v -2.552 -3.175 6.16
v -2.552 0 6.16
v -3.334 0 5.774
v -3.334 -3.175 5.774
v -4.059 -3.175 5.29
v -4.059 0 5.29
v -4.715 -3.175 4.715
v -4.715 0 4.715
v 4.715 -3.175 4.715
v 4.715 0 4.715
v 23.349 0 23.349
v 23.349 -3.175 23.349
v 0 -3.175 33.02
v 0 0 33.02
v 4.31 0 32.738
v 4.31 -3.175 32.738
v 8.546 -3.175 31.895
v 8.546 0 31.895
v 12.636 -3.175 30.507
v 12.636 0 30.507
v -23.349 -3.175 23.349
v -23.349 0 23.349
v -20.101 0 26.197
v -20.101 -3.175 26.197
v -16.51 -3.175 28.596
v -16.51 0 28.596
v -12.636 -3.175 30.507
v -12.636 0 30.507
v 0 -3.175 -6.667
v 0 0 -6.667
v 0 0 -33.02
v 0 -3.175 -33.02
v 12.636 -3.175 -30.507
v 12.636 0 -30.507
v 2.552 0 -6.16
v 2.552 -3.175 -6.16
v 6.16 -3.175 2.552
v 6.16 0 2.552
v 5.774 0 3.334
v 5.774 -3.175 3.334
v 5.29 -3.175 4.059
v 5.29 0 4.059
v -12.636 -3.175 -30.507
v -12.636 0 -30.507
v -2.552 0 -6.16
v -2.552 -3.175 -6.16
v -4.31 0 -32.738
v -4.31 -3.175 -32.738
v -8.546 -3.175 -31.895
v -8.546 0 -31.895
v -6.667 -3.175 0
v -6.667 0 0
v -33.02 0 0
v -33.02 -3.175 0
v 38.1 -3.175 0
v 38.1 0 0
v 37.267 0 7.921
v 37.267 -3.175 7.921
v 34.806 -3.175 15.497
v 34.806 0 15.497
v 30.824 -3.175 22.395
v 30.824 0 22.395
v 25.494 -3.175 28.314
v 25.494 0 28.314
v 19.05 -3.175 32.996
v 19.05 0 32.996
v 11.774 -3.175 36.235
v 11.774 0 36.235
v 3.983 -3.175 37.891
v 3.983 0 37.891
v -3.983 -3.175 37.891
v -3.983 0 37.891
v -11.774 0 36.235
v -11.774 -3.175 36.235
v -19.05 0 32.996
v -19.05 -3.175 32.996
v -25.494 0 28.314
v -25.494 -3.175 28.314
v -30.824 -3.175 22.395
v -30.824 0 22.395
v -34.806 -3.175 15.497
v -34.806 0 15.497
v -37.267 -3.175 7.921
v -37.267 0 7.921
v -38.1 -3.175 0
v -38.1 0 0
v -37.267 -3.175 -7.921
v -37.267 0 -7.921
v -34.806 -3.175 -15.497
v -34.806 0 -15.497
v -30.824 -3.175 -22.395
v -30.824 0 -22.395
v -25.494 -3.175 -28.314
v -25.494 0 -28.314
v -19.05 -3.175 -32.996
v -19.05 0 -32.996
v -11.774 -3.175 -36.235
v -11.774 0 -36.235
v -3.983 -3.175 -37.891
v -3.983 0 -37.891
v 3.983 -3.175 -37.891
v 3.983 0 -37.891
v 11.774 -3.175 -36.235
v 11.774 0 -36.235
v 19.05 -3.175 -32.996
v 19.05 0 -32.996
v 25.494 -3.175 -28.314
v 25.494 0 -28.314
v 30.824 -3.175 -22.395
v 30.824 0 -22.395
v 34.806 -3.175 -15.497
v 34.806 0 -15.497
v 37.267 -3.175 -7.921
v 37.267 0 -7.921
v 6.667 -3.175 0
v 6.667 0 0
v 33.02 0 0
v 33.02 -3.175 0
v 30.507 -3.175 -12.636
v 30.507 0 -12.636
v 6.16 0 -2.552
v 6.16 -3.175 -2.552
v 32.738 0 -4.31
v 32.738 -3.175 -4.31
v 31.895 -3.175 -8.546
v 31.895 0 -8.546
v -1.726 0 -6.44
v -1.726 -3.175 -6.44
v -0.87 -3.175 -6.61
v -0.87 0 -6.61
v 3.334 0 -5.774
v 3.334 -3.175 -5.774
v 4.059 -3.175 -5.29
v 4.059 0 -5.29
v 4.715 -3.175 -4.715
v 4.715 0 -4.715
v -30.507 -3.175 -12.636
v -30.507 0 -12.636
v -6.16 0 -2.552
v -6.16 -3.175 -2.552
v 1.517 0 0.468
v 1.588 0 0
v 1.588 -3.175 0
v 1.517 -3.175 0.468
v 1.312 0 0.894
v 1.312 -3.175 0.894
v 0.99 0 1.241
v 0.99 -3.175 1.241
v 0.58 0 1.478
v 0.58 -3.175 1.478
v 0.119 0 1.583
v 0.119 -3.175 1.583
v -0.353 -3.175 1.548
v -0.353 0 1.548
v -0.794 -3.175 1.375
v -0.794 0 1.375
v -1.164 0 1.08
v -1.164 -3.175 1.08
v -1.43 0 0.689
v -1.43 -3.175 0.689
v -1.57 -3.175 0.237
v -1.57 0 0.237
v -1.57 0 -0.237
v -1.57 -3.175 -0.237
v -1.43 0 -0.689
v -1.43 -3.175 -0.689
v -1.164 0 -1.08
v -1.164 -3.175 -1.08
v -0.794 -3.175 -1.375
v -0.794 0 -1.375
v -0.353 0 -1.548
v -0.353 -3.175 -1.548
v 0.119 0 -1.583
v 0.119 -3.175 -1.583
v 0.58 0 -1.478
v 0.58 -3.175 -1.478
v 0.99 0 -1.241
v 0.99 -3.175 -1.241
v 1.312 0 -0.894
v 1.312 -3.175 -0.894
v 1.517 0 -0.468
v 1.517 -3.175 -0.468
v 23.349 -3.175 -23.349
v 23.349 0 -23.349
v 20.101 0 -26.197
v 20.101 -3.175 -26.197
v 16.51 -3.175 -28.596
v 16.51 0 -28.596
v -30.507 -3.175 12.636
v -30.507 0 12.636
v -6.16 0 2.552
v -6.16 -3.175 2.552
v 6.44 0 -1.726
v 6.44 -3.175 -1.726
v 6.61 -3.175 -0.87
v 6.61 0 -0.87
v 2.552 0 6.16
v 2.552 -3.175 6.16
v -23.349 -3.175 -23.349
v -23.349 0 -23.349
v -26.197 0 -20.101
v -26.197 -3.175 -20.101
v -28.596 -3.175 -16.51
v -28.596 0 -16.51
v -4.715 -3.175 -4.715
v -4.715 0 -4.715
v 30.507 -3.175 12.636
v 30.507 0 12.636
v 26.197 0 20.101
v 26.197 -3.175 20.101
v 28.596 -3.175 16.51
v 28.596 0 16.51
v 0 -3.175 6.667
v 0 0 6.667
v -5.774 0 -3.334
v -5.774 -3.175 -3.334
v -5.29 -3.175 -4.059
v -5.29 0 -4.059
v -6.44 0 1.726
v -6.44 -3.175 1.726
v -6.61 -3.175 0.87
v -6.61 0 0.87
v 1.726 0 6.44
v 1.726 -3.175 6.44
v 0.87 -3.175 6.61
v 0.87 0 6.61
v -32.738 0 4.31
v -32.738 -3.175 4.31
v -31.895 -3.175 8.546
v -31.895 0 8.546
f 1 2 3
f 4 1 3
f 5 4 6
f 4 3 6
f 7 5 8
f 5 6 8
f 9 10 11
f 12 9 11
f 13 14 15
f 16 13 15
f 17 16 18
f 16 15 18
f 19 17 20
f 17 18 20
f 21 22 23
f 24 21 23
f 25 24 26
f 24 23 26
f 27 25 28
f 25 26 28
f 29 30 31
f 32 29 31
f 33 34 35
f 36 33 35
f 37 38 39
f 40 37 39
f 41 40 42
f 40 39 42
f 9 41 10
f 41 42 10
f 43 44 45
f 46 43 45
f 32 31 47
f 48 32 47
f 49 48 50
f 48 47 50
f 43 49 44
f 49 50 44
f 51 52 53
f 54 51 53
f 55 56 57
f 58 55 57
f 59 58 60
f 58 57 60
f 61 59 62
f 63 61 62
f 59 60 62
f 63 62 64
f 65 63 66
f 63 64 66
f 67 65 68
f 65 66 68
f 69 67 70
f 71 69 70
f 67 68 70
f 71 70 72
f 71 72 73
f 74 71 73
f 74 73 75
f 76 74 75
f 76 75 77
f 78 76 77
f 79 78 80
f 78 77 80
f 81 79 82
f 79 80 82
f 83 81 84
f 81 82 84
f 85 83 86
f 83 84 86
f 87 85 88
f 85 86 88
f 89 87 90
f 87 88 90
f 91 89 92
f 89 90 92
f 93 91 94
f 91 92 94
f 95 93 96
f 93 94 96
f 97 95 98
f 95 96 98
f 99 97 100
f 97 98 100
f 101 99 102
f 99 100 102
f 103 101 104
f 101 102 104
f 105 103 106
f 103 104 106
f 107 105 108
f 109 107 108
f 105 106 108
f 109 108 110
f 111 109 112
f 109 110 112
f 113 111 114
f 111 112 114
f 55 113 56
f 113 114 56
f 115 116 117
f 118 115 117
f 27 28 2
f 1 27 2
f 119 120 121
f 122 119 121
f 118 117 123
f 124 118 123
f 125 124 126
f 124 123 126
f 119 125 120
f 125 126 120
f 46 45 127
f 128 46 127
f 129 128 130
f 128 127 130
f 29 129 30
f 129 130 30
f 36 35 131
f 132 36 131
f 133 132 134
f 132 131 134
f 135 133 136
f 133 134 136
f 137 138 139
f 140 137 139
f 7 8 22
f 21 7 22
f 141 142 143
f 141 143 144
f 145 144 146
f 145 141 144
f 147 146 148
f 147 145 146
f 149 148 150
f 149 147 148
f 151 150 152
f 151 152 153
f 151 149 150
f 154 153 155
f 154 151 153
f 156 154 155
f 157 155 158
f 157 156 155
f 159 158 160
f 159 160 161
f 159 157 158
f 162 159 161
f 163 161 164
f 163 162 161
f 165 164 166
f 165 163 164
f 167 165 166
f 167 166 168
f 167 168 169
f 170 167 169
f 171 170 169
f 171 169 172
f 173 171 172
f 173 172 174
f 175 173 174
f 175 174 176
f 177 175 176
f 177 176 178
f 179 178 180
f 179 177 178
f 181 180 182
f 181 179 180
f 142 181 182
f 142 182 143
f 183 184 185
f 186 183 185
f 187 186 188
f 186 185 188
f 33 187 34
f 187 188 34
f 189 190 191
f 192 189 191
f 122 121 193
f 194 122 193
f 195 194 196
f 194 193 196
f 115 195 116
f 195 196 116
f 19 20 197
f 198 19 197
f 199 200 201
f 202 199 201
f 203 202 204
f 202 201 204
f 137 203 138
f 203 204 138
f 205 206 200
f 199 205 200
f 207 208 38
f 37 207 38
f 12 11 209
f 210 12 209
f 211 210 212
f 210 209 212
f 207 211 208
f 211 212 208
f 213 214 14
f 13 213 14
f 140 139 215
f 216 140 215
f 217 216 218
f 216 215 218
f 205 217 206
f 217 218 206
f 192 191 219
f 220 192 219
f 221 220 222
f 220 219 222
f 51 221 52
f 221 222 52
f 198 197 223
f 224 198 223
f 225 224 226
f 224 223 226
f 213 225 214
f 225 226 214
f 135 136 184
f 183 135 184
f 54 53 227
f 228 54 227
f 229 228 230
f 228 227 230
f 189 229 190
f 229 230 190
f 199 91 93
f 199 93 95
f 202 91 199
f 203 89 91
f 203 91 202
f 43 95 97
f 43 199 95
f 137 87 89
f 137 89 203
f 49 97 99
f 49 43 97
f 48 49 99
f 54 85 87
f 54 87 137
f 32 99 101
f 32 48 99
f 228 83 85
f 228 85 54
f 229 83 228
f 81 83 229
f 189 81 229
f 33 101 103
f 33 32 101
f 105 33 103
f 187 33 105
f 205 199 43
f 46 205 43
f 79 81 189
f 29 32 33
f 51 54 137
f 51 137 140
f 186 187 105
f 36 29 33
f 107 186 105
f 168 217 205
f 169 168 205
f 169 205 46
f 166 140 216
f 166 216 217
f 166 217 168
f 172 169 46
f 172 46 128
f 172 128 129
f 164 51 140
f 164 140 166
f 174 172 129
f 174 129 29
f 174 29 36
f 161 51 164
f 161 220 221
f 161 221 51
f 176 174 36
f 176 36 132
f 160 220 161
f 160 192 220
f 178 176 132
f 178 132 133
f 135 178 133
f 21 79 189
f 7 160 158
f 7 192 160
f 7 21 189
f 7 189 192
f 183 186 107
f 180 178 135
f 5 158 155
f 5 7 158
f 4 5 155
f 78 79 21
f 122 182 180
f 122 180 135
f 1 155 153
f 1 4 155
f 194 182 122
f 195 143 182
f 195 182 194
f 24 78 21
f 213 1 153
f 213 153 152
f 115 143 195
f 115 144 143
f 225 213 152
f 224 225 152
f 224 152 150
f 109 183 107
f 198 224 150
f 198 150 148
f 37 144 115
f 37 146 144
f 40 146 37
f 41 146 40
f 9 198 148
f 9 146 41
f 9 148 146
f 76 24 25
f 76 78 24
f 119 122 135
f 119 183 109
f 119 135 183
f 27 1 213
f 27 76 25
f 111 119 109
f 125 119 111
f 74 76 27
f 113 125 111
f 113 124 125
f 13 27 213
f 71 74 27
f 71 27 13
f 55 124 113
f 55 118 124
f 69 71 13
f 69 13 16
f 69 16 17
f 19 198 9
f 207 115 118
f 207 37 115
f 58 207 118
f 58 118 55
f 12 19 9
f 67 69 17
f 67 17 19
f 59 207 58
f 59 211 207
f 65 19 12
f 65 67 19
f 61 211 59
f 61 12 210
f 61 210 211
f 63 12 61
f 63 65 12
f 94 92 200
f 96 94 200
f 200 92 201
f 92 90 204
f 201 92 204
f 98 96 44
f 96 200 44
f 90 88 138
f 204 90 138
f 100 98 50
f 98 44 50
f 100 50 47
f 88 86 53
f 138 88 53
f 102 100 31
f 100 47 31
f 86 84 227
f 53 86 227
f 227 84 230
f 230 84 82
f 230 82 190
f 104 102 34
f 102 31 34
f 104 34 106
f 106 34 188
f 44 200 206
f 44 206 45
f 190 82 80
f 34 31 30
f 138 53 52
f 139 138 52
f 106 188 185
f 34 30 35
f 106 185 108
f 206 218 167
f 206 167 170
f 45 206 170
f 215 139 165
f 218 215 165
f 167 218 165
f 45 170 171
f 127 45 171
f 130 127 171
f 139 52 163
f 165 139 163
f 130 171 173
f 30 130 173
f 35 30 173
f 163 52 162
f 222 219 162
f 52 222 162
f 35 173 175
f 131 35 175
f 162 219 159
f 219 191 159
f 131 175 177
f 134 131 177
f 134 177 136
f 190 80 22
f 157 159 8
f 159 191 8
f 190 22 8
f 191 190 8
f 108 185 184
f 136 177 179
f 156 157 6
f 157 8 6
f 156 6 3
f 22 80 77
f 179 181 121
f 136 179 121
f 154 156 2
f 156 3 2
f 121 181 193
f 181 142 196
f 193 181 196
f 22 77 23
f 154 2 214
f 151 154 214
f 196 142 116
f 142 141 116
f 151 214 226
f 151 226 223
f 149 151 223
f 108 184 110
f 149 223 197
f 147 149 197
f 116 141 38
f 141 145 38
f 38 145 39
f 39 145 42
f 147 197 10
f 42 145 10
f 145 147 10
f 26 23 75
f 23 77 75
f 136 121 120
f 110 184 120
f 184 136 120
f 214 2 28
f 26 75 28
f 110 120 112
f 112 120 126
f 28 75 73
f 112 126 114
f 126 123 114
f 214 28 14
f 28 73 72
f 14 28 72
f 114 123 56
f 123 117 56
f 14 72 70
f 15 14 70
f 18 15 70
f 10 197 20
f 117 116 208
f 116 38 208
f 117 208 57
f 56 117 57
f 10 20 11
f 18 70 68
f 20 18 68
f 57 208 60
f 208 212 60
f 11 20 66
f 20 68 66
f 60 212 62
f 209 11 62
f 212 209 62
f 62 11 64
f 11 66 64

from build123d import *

# Parameters (mm, degrees)
F0_R     = 38.1
F0_R_2   = 1.5875
F1_DEPTH = 3.175
F2_DEPTH = 3.175


# Not quite as in the source:
# - a feature names something its author has since deleted; it is built from what else it names


with BuildPart() as f1:
    # F0 (on Front) → F1 (new body)
    with BuildSketch(Plane.XZ):
        Circle(F0_R)
        with BuildLine():
            ThreePointArc((30.5065021635, 12.6362069367), (32.3855299589, 6.441882433), (33.02, 0))
            ThreePointArc((33.02, 0), (32.3855299589, -6.441882433), (30.5065021635, -12.6362069367))
            ThreePointArc((30.5065021635, -12.6362069367), (27.4551265982, -18.3449290943), (23.3486659148, -23.3486659148))
            ThreePointArc((23.3486659148, -23.3486659148), (18.3449290943, -27.4551265982), (12.6362069367, -30.5065021635))
            ThreePointArc((12.6362069367, -30.5065021635), (6.441882433, -32.3855299589), (0, -33.02))
            ThreePointArc((0, -33.02), (-6.441882433, -32.3855299589), (-12.6362069367, -30.5065021635))
            ThreePointArc((-12.6362069367, -30.5065021635), (-18.3449290943, -27.4551265982), (-23.3486659148, -23.3486659148))
            ThreePointArc((-23.3486659148, -23.3486659148), (-27.4551265982, -18.3449290943), (-30.5065021635, -12.6362069367))
            ThreePointArc((-30.5065021635, -12.6362069367), (-32.3855299589, -6.441882433), (-33.02, 0))
            ThreePointArc((-33.02, 0), (-32.3855299589, 6.441882433), (-30.5065021635, 12.6362069367))
            ThreePointArc((-30.5065021635, 12.6362069367), (-27.4551265982, 18.3449290943), (-23.3486659148, 23.3486659148))
            ThreePointArc((-23.3486659148, 23.3486659148), (-18.3449290943, 27.4551265982), (-12.6362069367, 30.5065021635))
            ThreePointArc((-12.6362069367, 30.5065021635), (-6.441882433, 32.3855299589), (0, 33.02))
            ThreePointArc((0, 33.02), (6.441882433, 32.3855299589), (12.6362069367, 30.5065021635))
            ThreePointArc((12.6362069367, 30.5065021635), (18.3449290943, 27.4551265982), (23.3486659148, 23.3486659148))
            ThreePointArc((23.3486659148, 23.3486659148), (27.4551265982, 18.3449290943), (30.5065021635, 12.6362069367))
        make_face(mode=Mode.SUBTRACT)
        with BuildLine():
            ThreePointArc((6.159966783, -2.5515417853), (6.5393858571, -1.300764722), (6.6675, 0))
            ThreePointArc((6.6675, 0), (6.5393858571, 1.300764722), (6.159966783, 2.5515417853))
            ThreePointArc((6.159966783, 2.5515417853), (5.54382364, 3.7042645287), (4.7146344636, 4.7146344636))
            ThreePointArc((4.7146344636, 4.7146344636), (3.7042645287, 5.54382364), (2.5515417853, 6.159966783))
            ThreePointArc((2.5515417853, 6.159966783), (1.300764722, 6.5393858571), (0, 6.6675))
            ThreePointArc((0, 6.6675), (-1.300764722, 6.5393858571), (-2.5515417853, 6.159966783))
            ThreePointArc((-2.5515417853, 6.159966783), (-3.7042645287, 5.54382364), (-4.7146344636, 4.7146344636))
            ThreePointArc((-4.7146344636, 4.7146344636), (-5.54382364, 3.7042645287), (-6.159966783, 2.5515417853))
            ThreePointArc((-6.159966783, 2.5515417853), (-6.5393858571, 1.300764722), (-6.6675, 0))
            ThreePointArc((-6.6675, 0), (-6.5393858571, -1.300764722), (-6.159966783, -2.5515417853))
            ThreePointArc((-6.159966783, -2.5515417853), (-5.54382364, -3.7042645287), (-4.7146344636, -4.7146344636))
            ThreePointArc((-4.7146344636, -4.7146344636), (-3.7042645287, -5.54382364), (-2.5515417853, -6.159966783))
            ThreePointArc((-2.5515417853, -6.159966783), (-1.300764722, -6.5393858571), (0, -6.6675))
            ThreePointArc((0, -6.6675), (1.300764722, -6.5393858571), (2.5515417853, -6.159966783))
            ThreePointArc((2.5515417853, -6.159966783), (3.7042645287, -5.54382364), (4.7146344636, -4.7146344636))
            ThreePointArc((4.7146344636, -4.7146344636), (5.54382364, -3.7042645287), (6.159966783, -2.5515417853))
        make_face()
        Circle(F0_R_2, mode=Mode.SUBTRACT)
        with BuildLine():
            ThreePointArc((0, -33.02), (6.441882433, -32.3855299589), (12.6362069367, -30.5065021635))
            Line((12.6362069367, -30.5065021635), (2.5515417853, -6.159966783))
            ThreePointArc((2.5515417853, -6.159966783), (1.300764722, -6.5393858571), (0, -6.6675))
            Line((0, -6.6675), (0, -33.02))
        make_face()
    extrude(amount=F1_DEPTH)

    # F0 (on Front) → F2 (join)
    with BuildSketch(Plane.XZ):
        Circle(F0_R)
        with BuildLine():
            ThreePointArc((30.5065021635, 12.6362069367), (32.3855299589, 6.441882433), (33.02, 0))
            ThreePointArc((33.02, 0), (32.3855299589, -6.441882433), (30.5065021635, -12.6362069367))
            ThreePointArc((30.5065021635, -12.6362069367), (27.4551265982, -18.3449290943), (23.3486659148, -23.3486659148))
            ThreePointArc((23.3486659148, -23.3486659148), (18.3449290943, -27.4551265982), (12.6362069367, -30.5065021635))
            ThreePointArc((12.6362069367, -30.5065021635), (6.441882433, -32.3855299589), (0, -33.02))
            ThreePointArc((0, -33.02), (-6.441882433, -32.3855299589), (-12.6362069367, -30.5065021635))
            ThreePointArc((-12.6362069367, -30.5065021635), (-18.3449290943, -27.4551265982), (-23.3486659148, -23.3486659148))
            ThreePointArc((-23.3486659148, -23.3486659148), (-27.4551265982, -18.3449290943), (-30.5065021635, -12.6362069367))
            ThreePointArc((-30.5065021635, -12.6362069367), (-32.3855299589, -6.441882433), (-33.02, 0))
            ThreePointArc((-33.02, 0), (-32.3855299589, 6.441882433), (-30.5065021635, 12.6362069367))
            ThreePointArc((-30.5065021635, 12.6362069367), (-27.4551265982, 18.3449290943), (-23.3486659148, 23.3486659148))
            ThreePointArc((-23.3486659148, 23.3486659148), (-18.3449290943, 27.4551265982), (-12.6362069367, 30.5065021635))
            ThreePointArc((-12.6362069367, 30.5065021635), (-6.441882433, 32.3855299589), (0, 33.02))
            ThreePointArc((0, 33.02), (6.441882433, 32.3855299589), (12.6362069367, 30.5065021635))
            ThreePointArc((12.6362069367, 30.5065021635), (18.3449290943, 27.4551265982), (23.3486659148, 23.3486659148))
            ThreePointArc((23.3486659148, 23.3486659148), (27.4551265982, 18.3449290943), (30.5065021635, 12.6362069367))
        make_face(mode=Mode.SUBTRACT)
        with BuildLine():
            ThreePointArc((-23.3486659148, -23.3486659148), (-18.3449290943, -27.4551265982), (-12.6362069367, -30.5065021635))
            Line((-12.6362069367, -30.5065021635), (-2.5515417853, -6.159966783))
            ThreePointArc((-2.5515417853, -6.159966783), (-3.7042645287, -5.54382364), (-4.7146344636, -4.7146344636))
            Line((-4.7146344636, -4.7146344636), (-23.3486659148, -23.3486659148))
        make_face()
        with BuildLine():
            ThreePointArc((-33.02, 0), (-32.3855299589, -6.441882433), (-30.5065021635, -12.6362069367))
            Line((-30.5065021635, -12.6362069367), (-6.159966783, -2.5515417853))
            ThreePointArc((-6.159966783, -2.5515417853), (-6.5393858571, -1.300764722), (-6.6675, 0))
            Line((-6.6675, 0), (-33.02, 0))
        make_face()
        with BuildLine():
            Line((-4.7146344636, 4.7146344636), (-23.3486659148, 23.3486659148))
            ThreePointArc((-23.3486659148, 23.3486659148), (-27.4551265982, 18.3449290943), (-30.5065021635, 12.6362069367))
            Line((-30.5065021635, 12.6362069367), (-6.159966783, 2.5515417853))
            ThreePointArc((-6.159966783, 2.5515417853), (-5.54382364, 3.7042645287), (-4.7146344636, 4.7146344636))
        make_face()
        with BuildLine():
            Line((0, 6.6675), (0, 33.02))
            ThreePointArc((0, 33.02), (-6.441882433, 32.3855299589), (-12.6362069367, 30.5065021635))
            Line((-12.6362069367, 30.5065021635), (-2.5515417853, 6.159966783))
            ThreePointArc((-2.5515417853, 6.159966783), (-1.300764722, 6.5393858571), (0, 6.6675))
        make_face()
        with BuildLine():
            Line((4.7146344636, 4.7146344636), (23.3486659148, 23.3486659148))
            ThreePointArc((23.3486659148, 23.3486659148), (18.3449290943, 27.4551265982), (12.6362069367, 30.5065021635))
            Line((12.6362069367, 30.5065021635), (2.5515417853, 6.159966783))
            ThreePointArc((2.5515417853, 6.159966783), (3.7042645287, 5.54382364), (4.7146344636, 4.7146344636))
        make_face()
        with BuildLine():
            Line((6.6675, 0), (33.02, 0))
            ThreePointArc((33.02, 0), (32.3855299589, 6.441882433), (30.5065021635, 12.6362069367))
            Line((30.5065021635, 12.6362069367), (6.159966783, 2.5515417853))
            ThreePointArc((6.159966783, 2.5515417853), (6.5393858571, 1.300764722), (6.6675, 0))
        make_face()
        with BuildLine():
            ThreePointArc((23.3486659148, -23.3486659148), (27.4551265982, -18.3449290943), (30.5065021635, -12.6362069367))
            Line((30.5065021635, -12.6362069367), (6.159966783, -2.5515417853))
            ThreePointArc((6.159966783, -2.5515417853), (5.54382364, -3.7042645287), (4.7146344636, -4.7146344636))
            Line((4.7146344636, -4.7146344636), (23.3486659148, -23.3486659148))
        make_face()
    extrude(amount=F2_DEPTH)


solid = f1.part
